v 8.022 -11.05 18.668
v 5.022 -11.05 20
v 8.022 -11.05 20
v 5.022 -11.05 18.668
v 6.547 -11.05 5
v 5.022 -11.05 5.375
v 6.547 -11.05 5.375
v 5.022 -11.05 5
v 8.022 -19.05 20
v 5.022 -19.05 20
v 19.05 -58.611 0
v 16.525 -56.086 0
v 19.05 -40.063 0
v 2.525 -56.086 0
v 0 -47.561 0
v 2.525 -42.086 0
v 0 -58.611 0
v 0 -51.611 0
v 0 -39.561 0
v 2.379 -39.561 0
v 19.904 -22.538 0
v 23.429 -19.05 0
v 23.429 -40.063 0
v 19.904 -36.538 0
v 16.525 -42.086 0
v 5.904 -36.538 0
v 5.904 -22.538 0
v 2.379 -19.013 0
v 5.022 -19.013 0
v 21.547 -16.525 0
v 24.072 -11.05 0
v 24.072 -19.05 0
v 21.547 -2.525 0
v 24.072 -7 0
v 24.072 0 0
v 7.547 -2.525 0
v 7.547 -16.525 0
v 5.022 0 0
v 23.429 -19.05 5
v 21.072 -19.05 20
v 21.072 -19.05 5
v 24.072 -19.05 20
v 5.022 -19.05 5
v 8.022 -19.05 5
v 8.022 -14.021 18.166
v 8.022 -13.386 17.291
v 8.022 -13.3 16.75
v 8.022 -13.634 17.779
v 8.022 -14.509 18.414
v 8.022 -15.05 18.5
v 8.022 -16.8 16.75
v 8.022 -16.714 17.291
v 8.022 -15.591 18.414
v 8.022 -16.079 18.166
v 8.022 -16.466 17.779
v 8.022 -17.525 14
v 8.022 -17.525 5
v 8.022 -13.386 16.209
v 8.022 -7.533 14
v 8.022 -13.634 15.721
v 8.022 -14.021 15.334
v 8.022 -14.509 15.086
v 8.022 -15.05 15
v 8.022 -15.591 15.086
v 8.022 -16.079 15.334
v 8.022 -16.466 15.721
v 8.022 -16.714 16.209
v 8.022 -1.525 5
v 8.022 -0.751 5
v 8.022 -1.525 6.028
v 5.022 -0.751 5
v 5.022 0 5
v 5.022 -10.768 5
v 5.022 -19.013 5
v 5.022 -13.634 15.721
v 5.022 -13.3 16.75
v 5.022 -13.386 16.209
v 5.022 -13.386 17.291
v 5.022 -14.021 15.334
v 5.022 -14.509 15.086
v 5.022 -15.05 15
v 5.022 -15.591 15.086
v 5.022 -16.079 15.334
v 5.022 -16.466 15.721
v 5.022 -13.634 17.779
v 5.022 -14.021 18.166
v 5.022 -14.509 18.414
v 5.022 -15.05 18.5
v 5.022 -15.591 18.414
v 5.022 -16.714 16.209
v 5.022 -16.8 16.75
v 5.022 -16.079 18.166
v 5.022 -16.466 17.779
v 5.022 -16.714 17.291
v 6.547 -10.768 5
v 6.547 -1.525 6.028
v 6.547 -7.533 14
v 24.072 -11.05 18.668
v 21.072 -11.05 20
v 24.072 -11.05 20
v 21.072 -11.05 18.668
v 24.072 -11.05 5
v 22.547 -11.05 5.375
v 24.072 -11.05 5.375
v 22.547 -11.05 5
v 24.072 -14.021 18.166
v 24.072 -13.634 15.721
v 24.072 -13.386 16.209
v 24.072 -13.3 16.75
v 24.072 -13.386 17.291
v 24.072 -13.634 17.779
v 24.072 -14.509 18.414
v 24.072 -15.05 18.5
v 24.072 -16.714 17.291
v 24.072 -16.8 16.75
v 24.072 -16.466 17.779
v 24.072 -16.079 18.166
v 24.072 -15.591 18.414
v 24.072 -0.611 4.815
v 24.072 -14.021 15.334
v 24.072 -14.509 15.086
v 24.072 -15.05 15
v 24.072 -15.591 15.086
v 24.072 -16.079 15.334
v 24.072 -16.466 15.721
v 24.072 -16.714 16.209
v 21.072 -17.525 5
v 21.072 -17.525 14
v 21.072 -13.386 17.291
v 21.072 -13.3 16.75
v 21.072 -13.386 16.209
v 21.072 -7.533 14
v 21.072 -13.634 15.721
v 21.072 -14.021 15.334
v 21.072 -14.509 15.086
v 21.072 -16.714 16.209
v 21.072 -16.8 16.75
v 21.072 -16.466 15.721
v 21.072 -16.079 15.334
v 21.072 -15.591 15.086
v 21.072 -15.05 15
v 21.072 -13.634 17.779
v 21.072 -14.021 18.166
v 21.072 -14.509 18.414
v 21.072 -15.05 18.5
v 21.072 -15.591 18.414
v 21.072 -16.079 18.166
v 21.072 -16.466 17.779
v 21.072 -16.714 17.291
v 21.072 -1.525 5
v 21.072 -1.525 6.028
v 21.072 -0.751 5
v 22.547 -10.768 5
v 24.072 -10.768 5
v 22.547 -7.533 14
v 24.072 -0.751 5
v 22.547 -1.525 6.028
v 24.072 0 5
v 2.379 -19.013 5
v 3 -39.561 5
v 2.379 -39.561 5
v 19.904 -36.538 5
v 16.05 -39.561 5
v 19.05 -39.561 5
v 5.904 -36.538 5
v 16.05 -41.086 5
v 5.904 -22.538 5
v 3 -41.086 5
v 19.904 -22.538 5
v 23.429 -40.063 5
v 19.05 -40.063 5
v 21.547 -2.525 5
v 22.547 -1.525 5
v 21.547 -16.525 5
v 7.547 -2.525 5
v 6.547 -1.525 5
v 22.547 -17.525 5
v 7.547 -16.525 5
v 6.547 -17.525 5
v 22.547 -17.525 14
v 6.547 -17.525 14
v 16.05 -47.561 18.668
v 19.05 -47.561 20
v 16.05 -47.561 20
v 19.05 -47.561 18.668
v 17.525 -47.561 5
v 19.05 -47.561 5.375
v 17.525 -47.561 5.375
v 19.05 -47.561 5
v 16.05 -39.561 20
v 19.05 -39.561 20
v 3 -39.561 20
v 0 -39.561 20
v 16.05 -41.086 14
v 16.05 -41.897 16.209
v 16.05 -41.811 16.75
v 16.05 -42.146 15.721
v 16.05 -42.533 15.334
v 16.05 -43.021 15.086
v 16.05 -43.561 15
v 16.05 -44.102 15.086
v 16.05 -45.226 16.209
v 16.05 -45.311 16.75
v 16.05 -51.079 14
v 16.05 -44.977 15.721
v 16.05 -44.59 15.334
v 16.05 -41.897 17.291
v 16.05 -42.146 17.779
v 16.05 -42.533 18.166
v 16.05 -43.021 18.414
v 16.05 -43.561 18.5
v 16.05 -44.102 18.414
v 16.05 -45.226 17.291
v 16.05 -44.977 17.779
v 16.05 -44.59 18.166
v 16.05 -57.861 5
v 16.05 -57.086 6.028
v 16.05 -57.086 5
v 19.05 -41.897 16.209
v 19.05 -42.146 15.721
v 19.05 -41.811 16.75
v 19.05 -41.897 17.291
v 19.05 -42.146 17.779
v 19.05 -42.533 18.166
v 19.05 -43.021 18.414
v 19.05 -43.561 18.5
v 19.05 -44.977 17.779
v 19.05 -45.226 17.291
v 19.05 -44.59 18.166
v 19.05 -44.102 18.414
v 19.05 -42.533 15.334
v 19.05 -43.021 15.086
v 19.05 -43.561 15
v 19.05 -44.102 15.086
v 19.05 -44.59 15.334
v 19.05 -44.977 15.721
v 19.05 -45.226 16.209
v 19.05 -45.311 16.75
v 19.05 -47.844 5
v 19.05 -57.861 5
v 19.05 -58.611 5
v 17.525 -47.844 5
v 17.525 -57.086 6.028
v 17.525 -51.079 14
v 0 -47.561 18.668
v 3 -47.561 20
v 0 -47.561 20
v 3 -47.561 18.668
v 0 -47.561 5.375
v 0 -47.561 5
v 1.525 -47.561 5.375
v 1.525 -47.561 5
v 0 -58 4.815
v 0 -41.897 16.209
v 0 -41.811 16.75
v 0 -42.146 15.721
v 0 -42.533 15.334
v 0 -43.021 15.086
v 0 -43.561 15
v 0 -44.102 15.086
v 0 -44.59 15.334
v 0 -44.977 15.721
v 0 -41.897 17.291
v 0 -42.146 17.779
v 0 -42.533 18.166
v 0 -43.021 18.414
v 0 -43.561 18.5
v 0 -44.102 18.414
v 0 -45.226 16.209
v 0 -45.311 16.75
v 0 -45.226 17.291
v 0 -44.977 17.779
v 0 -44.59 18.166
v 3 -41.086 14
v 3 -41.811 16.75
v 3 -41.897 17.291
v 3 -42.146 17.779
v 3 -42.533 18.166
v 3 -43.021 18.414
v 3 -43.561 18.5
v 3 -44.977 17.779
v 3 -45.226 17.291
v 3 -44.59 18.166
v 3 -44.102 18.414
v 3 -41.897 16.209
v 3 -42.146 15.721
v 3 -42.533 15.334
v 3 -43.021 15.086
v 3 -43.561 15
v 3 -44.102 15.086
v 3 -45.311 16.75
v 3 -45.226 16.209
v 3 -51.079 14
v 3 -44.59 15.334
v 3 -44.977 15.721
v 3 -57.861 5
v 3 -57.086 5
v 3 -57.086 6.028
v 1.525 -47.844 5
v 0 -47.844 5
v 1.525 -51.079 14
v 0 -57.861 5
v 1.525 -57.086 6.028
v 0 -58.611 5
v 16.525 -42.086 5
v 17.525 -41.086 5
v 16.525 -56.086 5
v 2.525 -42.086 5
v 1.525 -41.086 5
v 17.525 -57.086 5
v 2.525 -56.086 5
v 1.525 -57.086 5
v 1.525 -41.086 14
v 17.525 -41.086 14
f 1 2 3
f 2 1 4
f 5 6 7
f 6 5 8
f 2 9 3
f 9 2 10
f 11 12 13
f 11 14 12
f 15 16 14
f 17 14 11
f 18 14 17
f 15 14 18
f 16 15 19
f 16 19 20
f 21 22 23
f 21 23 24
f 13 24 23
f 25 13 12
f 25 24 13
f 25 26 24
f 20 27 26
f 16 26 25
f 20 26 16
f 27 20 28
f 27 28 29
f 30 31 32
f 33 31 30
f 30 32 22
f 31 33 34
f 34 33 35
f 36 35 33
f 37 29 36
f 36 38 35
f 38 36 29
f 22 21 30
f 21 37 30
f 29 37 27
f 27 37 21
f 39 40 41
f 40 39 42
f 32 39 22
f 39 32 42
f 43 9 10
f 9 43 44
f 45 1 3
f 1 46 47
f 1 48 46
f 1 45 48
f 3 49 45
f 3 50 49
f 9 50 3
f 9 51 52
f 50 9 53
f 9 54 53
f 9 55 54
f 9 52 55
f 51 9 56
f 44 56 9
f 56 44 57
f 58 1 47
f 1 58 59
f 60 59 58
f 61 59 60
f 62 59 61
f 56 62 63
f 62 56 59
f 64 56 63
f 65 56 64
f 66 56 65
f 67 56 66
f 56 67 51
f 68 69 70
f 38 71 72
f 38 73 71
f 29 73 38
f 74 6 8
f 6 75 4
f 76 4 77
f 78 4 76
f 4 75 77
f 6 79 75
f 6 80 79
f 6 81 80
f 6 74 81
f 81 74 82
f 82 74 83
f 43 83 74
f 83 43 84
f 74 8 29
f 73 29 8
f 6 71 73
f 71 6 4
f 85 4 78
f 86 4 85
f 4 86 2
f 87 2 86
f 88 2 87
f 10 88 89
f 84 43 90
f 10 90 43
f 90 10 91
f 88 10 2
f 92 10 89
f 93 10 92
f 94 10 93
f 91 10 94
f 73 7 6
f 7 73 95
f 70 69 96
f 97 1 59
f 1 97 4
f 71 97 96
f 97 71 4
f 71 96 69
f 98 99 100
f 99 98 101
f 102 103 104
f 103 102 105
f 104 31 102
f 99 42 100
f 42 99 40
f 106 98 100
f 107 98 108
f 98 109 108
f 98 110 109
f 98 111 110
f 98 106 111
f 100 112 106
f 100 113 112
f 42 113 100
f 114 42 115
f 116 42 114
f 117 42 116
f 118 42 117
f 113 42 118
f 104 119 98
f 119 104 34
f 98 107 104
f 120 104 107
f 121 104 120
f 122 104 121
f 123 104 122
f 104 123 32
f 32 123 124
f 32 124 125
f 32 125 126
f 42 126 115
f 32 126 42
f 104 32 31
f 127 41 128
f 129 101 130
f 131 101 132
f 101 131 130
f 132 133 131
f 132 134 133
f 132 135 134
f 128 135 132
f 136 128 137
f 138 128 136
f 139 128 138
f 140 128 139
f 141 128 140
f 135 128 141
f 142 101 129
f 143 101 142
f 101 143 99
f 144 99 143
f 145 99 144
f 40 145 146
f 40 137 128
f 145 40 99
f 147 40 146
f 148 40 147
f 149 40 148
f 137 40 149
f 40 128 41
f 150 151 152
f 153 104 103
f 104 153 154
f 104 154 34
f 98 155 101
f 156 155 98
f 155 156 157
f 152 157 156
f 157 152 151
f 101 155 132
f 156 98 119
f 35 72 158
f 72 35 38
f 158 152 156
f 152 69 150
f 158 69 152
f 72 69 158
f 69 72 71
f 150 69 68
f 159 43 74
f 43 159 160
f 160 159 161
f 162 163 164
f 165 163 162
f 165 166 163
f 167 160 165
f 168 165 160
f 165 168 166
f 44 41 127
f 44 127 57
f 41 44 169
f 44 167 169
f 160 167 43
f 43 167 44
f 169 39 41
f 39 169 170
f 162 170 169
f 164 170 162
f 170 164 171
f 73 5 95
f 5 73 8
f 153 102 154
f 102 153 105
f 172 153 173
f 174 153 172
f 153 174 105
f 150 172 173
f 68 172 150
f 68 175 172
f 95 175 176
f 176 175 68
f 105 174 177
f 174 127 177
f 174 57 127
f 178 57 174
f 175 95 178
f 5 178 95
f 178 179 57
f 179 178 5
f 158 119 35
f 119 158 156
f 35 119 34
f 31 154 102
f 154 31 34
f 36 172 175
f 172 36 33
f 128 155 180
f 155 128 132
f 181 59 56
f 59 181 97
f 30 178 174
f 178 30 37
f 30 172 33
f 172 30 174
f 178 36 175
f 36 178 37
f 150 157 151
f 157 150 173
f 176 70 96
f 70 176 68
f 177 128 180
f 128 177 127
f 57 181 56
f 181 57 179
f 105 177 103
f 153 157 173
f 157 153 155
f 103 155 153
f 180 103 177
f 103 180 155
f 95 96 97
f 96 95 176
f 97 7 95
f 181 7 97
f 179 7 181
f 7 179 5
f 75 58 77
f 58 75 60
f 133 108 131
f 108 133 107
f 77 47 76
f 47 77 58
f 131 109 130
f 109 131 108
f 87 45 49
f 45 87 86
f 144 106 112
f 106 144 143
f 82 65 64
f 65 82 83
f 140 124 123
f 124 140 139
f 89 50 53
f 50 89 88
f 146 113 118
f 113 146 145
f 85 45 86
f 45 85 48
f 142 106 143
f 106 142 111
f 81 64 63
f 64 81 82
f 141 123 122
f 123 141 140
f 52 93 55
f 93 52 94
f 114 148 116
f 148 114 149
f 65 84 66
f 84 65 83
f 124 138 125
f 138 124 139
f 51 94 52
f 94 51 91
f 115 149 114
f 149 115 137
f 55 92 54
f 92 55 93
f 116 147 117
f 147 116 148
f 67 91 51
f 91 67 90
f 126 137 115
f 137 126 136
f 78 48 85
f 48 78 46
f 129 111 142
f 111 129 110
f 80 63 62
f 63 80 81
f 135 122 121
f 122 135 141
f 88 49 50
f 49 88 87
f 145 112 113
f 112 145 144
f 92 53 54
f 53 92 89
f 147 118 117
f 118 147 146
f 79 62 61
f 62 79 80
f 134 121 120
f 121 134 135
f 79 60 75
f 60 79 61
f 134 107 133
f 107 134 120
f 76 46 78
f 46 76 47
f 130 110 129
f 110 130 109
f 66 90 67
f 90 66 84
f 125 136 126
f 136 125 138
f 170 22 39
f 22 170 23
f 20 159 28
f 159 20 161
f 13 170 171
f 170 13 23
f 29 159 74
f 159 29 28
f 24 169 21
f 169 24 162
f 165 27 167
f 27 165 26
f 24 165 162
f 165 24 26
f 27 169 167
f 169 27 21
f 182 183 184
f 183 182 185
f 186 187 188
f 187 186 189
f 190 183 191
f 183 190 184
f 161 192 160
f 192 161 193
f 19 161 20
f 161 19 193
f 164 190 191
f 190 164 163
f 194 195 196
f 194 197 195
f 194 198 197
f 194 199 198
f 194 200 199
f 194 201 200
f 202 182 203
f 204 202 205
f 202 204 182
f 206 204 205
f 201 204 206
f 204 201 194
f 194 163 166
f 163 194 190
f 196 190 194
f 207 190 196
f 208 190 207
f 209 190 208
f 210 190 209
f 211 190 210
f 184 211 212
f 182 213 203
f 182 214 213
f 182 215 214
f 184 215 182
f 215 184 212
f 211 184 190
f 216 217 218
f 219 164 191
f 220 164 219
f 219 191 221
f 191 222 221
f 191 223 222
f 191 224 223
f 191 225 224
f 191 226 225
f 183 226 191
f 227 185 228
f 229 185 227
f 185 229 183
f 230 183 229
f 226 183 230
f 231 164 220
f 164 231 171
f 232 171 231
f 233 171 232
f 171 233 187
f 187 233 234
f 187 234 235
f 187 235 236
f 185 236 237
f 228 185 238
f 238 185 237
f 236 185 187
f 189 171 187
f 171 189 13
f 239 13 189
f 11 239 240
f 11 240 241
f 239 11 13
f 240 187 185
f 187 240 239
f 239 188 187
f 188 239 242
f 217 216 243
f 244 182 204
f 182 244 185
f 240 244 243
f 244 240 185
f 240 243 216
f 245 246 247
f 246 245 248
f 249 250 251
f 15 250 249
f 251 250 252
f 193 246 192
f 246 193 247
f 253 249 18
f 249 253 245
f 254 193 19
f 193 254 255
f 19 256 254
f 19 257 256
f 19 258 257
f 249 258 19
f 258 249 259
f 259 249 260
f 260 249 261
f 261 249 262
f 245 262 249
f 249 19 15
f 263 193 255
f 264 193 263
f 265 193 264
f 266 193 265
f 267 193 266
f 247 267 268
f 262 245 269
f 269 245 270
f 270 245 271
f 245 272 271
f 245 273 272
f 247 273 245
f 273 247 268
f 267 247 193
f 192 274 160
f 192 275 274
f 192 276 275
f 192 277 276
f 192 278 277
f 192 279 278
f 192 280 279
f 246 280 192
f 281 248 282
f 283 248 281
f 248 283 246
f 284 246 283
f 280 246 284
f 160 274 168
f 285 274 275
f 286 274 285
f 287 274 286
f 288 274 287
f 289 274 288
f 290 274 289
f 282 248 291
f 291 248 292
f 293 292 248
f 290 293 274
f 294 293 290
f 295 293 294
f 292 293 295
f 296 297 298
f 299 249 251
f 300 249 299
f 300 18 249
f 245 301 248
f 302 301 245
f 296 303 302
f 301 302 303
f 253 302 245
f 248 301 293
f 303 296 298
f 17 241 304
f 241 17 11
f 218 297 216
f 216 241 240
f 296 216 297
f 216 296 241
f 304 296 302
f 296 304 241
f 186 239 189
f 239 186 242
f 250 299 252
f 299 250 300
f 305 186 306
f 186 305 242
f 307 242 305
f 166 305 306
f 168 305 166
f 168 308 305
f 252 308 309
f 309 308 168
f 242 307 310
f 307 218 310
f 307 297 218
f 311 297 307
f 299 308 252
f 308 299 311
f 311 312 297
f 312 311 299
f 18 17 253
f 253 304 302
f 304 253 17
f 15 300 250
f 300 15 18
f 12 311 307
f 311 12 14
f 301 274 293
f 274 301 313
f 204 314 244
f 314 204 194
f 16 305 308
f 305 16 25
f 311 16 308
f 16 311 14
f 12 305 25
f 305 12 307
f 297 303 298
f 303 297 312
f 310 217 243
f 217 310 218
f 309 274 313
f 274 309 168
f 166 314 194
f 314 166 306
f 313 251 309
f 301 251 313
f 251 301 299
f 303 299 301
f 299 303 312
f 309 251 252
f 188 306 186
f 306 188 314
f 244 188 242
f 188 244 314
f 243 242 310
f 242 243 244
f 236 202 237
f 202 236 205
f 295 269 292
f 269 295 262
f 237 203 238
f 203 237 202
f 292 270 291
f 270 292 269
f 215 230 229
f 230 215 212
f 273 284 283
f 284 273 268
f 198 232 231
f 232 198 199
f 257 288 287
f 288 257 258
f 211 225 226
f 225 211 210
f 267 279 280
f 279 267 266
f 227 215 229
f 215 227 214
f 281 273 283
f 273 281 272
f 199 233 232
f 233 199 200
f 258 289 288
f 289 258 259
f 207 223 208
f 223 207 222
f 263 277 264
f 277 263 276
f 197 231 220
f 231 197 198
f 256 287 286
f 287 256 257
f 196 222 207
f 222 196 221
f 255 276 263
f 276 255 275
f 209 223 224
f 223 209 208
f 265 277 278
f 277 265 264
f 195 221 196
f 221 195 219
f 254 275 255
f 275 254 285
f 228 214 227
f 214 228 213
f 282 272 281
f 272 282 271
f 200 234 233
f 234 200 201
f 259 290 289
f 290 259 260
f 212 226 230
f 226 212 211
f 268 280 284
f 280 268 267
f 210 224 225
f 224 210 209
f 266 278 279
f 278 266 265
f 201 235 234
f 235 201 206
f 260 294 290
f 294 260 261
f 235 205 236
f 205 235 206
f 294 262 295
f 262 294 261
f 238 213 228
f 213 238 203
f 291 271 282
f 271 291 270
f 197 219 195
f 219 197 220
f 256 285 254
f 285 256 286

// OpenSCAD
$fn=20;
unit = 19.05;
u = unit;
switch_bottom_height= 5;
sbh = switch_bottom_height;
switch_bottom_diameter= 14;
sbd = switch_bottom_diameter;
axel_diameter = 3.5;
paddle_position_height  = 11;
paddle_height = 20;
ph = 20;
paddle_width = 8;
pw = paddle_width;
paddle_depth = 3;
pd = paddle_depth;
signum31_left_paddle_triad();
// signum31_right_paddle_triad();
// signum30_left_paddle_triad();
// signum30_right_paddle_triad();
// paddle();
// UNCOMMENT ABOVE THE TRIAD YOU WANT TO RENDER
module signum31_left_paddle_triad() {
  mirror([0, 1, 0]) {signum31_right_paddle_triad();}
};
module signum31_right_paddle_triad() {
  translate([5.022193,0,0]){
    translate([0,u,0]){
      rotate([0,0,-90]){
	base();
      };
    };
  };
  translate([3.378522,20.01308,0]){
    difference() {
      translate([-1,-1,0]){
	cube([u+2,u+2,sbh]);
      };
      translate([(u-sbd)/2,(u-sbd)/2,-1]){
	cube([sbd,sbd,sbh+10]);
      };
    };
  };
  translate([u,39.561307,0]){
    rotate([0,0,90]){
      base();
    };
  };
};
module signum30_left_paddle_triad() {
  mirror([0, 1, 0]) {signum30_right_paddle_triad();}
};
module signum30_right_paddle_triad() {
  translate([3.719936,0,0]){
    translate([0,u,0]){
      rotate([0,0,-90]){
	base();
      };
    };
  };
  translate([0.871598,19.517088,0]){
    difference() {
      translate([-1,-1,0]){
	cube([u+2,u+2,sbh]);
      };
      translate([(u-sbd)/2,(u-sbd)/2,-1]){
	cube([sbd,sbd,sbh+10]);
      };
    };
  };
  translate([u,39.26772,0]){
    rotate([0,0,90]){
      base();
    };
  };
};
module base() {
  difference() {
    union() {
      cube([u,u,sbh]);
      stand();
      union() {
	translate([0,u-pd,0]){
	  stand();
	};
      };
    };
    translate([(u-sbd)/2,(u-sbd)/2,-1]){
      cube([sbd,sbd,sbh+10]);
      translate([-1,-1,6]){
	cube([sbd+2,sbd+2,sbh+4]);
      };
    };
    translate([pw/2,-1,(axel_diameter/2)+15]){
      rotate([-90,0,0]){
	cylinder(d=axel_diameter, h=u+2);
      };
    };
  };
};
module stand() {
  union() {
    cube([pw,pd,ph]);
    translate([u-7,0,0]){
      rotate([0,-37,0]){
	cube([pw,pd,ph-1]);
      };
    };
  };
};
module paddle() {
  translate([0,0,2]){
    translate([pd+0.5,0-(axel_diameter/2),0-(axel_diameter/2)]){
      cube([((u-(pd*2))-1),3.5,15]);
      cube([((u-(pd*2))-1),10,3.5]);
    };
    rotate([0,90,0]){
      translate([0,0,1]){
	#cylinder(d=axel_diameter-0.5, h=u-2);
      };
    };
  };
};
